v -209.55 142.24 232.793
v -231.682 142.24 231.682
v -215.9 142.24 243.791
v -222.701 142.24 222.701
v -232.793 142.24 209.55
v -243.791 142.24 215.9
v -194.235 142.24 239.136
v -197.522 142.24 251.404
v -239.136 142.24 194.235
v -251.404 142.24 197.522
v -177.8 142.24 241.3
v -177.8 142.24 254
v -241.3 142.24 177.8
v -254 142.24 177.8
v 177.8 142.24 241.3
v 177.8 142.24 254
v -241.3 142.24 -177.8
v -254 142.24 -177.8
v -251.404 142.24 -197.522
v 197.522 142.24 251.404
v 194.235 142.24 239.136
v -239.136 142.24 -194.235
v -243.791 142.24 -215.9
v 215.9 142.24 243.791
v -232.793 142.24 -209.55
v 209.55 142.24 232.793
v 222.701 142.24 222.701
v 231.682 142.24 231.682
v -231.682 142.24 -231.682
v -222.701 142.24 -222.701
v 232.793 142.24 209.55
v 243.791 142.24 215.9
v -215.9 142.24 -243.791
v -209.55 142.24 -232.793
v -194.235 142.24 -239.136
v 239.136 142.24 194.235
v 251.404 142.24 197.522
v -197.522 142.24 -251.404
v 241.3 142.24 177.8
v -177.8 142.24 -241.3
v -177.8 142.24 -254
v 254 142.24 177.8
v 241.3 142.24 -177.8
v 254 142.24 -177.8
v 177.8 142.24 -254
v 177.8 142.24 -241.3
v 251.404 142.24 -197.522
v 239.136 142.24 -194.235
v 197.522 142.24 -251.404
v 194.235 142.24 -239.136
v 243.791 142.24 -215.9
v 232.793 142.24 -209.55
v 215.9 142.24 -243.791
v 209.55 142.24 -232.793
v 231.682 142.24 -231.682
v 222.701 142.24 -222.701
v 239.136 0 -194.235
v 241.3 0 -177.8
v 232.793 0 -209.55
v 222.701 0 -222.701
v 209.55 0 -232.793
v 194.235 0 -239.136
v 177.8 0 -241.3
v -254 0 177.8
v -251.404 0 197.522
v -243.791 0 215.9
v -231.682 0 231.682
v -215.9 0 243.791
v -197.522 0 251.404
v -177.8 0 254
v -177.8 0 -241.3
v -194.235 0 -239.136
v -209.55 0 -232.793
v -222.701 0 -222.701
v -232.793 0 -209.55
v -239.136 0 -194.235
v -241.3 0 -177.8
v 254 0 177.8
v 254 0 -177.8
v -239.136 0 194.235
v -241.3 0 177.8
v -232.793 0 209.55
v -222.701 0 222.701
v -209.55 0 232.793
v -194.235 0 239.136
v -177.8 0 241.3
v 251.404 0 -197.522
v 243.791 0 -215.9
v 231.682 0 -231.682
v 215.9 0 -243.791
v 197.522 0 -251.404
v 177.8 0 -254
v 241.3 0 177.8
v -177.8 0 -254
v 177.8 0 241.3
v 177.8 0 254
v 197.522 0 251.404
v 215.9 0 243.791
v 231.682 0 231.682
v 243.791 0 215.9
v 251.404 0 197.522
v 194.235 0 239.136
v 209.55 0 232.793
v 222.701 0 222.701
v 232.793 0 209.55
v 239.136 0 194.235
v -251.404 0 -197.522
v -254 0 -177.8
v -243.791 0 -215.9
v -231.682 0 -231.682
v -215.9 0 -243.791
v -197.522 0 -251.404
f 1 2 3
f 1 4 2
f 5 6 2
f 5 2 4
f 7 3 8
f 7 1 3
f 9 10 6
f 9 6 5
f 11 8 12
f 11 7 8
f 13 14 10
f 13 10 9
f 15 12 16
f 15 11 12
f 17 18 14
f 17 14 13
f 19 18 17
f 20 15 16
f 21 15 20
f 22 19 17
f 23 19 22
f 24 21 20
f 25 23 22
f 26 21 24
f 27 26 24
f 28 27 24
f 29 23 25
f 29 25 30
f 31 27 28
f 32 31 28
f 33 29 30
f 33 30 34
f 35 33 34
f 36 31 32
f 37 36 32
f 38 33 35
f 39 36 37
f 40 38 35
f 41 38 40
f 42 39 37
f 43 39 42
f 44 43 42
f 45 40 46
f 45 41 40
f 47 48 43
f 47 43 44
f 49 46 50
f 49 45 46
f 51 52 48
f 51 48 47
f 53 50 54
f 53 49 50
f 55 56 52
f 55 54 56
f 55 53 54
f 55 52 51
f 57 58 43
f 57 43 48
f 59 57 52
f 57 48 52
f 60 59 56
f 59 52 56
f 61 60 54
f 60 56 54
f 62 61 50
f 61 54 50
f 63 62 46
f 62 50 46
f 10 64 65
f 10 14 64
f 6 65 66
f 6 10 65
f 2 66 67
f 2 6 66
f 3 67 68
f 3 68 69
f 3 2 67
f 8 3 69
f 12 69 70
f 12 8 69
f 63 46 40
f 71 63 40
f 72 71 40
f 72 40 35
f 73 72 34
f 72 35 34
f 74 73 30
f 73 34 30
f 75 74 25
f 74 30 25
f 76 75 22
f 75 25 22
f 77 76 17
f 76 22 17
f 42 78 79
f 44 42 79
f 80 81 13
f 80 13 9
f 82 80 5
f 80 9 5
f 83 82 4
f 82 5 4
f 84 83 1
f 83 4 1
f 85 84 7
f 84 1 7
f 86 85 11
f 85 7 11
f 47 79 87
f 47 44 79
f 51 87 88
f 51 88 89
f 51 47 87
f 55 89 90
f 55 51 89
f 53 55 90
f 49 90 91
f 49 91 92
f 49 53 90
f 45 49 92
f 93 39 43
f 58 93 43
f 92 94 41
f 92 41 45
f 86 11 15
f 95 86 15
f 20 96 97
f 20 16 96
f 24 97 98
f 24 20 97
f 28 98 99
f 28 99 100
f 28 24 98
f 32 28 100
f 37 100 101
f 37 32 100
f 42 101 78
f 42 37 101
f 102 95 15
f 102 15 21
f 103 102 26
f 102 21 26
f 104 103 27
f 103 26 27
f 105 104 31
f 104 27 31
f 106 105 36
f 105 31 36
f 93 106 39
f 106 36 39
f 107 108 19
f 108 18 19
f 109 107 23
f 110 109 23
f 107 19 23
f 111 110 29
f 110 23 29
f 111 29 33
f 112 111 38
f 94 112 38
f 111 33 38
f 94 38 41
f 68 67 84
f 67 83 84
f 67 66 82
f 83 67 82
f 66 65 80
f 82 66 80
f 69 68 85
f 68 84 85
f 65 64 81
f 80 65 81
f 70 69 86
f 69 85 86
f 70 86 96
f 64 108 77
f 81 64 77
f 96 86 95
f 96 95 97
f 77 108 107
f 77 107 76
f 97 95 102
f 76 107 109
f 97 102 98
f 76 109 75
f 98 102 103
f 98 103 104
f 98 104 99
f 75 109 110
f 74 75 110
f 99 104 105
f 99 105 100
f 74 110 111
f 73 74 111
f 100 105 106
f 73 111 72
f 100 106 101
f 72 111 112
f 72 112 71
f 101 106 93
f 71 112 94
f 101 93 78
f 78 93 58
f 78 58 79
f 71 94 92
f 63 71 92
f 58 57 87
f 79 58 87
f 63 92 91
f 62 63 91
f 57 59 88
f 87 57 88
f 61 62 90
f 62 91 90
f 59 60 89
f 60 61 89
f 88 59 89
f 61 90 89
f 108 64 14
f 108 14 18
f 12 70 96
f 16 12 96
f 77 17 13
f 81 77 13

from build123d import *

# Parameters (mm, degrees)
SKETCH1_W           = 508
SKETCH1_H           = 508
BOSS_EXTRUDE1_DEPTH = 142.24
FILLET1_R           = 76.2
CUT_EXTRUDE1_REACH  = 388.347


with BuildPart() as part:
    # Sketch1 → Boss-Extrude1 (new body)
    with BuildSketch(Plane(origin=(0, 0, 0), x_dir=(1, 0, 0), z_dir=(0, 1, 0))):
        Rectangle(SKETCH1_W, SKETCH1_H)
    extrude(amount=BOSS_EXTRUDE1_DEPTH)

    # Fillet1
    fillet1_edges = [part.edges().sort_by_distance(p)[0] for p in [
        (254, 71.12, 254),
        (-254, 71.12, 254),
        (-254, 71.12, -254),
        (254, 71.12, -254),
    ]]
    fillet(fillet1_edges, radius=FILLET1_R)

    # Sketch2 → Cut-Extrude1 (cut, up to next)
    with BuildSketch(Plane(origin=(0, 142.24, 0), x_dir=(1, 0, 0), z_dir=(0, 1, 0)), mode=Mode.PRIVATE) as cut_extrude1_sk1:
        with BuildLine():
            Line((-241.3, 177.8), (-241.3, -177.8))
            ThreePointArc((-241.3, -177.8), (-222.701280605, -222.701280605), (-177.8, -241.3))
            Line((-177.8, -241.3), (177.8, -241.3))
            ThreePointArc((177.8, -241.3), (222.701280605, -222.701280605), (241.3, -177.8))
            Line((241.3, -177.8), (241.3, 177.8))
            ThreePointArc((241.3, 177.8), (222.701280605, 222.701280605), (177.8, 241.3))
            Line((177.8, 241.3), (-177.8, 241.3))
            ThreePointArc((-177.8, 241.3), (-222.701280605, 222.701280605), (-241.3, 177.8))
        make_face()
    cut_extrude1_tool1 = extrude(cut_extrude1_sk1.sketch, amount=-CUT_EXTRUDE1_REACH, mode=Mode.PRIVATE) & part.part
    add(cut_extrude1_tool1.solids().sort_by_distance((0, 142.24, 0))[0], mode=Mode.SUBTRACT)


solid = part.part
